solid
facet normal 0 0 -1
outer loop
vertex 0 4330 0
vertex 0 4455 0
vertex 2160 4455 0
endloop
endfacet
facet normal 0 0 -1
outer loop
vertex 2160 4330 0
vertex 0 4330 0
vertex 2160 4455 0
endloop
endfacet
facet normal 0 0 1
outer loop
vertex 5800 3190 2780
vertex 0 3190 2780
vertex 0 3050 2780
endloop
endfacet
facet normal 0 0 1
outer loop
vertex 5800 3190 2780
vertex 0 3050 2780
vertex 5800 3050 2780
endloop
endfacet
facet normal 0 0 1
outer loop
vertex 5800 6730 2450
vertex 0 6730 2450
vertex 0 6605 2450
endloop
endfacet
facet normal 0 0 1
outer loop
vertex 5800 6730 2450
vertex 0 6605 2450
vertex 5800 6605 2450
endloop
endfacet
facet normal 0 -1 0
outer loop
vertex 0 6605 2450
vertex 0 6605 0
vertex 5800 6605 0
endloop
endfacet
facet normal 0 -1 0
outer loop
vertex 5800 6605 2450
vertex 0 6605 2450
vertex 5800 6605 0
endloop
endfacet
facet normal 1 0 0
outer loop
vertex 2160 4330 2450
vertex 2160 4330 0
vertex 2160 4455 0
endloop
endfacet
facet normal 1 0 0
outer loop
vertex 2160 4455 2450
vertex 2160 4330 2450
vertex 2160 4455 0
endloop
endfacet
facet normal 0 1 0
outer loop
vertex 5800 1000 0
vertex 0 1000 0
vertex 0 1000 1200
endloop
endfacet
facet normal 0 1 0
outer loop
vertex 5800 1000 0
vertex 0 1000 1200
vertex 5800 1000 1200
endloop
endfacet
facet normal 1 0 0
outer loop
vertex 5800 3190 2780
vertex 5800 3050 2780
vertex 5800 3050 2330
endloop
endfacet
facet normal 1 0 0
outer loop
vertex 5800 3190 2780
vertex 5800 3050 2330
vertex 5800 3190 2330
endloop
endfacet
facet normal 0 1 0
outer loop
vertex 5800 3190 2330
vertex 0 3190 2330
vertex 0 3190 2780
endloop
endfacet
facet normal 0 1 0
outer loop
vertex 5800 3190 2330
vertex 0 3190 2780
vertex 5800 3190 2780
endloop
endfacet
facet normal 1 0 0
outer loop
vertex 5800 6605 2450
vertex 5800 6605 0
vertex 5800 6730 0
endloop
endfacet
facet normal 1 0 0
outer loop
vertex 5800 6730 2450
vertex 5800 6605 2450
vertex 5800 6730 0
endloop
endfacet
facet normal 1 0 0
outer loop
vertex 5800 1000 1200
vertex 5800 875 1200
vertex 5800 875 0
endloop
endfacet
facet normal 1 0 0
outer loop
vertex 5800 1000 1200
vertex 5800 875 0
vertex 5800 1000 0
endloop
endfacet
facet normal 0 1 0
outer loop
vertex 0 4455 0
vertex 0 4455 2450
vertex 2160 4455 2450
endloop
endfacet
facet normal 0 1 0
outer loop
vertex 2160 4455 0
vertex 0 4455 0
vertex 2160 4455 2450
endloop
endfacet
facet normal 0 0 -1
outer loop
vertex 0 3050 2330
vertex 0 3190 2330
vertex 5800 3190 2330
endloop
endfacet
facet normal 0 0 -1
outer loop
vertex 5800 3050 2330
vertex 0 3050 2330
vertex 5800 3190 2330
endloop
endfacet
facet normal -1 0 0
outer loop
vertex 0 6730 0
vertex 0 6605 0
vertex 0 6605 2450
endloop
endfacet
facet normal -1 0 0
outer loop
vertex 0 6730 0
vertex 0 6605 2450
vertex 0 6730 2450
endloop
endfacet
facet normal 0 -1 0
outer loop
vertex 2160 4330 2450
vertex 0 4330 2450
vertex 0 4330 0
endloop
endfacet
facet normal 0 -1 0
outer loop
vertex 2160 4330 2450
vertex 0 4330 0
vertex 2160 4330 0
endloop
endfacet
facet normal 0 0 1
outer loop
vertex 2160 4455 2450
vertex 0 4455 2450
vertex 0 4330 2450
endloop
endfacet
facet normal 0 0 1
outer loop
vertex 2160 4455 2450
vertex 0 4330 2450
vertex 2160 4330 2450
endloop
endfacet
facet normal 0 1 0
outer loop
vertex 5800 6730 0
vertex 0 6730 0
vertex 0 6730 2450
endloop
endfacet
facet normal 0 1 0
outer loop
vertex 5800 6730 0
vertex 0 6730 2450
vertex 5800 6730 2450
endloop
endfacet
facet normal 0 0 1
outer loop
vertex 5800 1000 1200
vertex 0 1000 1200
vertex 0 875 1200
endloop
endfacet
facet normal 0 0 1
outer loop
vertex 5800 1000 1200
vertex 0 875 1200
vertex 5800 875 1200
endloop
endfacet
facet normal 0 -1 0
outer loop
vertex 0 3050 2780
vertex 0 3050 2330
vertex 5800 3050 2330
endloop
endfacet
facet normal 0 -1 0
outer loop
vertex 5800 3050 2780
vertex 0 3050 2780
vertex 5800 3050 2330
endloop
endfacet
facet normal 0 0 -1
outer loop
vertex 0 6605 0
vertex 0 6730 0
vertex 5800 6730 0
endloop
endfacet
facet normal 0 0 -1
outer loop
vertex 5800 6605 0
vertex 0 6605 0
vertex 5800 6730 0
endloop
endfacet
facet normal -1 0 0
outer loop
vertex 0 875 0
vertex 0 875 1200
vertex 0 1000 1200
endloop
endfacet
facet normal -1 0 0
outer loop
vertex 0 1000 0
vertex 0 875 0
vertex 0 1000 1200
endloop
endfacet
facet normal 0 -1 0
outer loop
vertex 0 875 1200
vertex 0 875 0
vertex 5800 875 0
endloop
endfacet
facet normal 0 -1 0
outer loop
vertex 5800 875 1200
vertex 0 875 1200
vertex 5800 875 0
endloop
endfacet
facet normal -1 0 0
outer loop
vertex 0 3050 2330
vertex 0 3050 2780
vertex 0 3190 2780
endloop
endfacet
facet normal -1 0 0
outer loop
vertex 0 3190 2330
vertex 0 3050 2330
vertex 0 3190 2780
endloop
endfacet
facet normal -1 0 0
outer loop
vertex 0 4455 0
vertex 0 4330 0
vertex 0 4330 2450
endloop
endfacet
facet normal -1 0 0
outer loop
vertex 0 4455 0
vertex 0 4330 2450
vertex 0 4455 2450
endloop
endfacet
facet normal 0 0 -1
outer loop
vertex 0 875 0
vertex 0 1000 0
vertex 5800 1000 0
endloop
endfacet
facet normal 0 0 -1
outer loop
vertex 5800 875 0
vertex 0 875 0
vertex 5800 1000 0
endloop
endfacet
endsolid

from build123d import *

# Parameters (mm, degrees)
F1_W     = 5800
F1_H     = 125
F2_DEPTH = 1200
F3_W     = 2160
F3_H     = 125
F4_DEPTH = 2450
F6_START = 2330
F5_W     = 5800
F5_H     = 140
F6_DEPTH = 450
F7_W     = 5800
F7_H     = 125
F8_DEPTH = 2450


with BuildPart() as f2:
    # F1 (on face) → F2 (new body)
    with BuildSketch(Plane.XY):
        with Locations((2900, 937.5)):
            Rectangle(F1_W, F1_H)
    extrude(amount=F2_DEPTH)


with BuildPart() as f4:
    # F3 (on face) → F4 (new body)
    with BuildSketch(Plane.XY):
        with Locations((1080, 4392.5)):
            Rectangle(F3_W, F3_H)
    extrude(amount=F4_DEPTH)


with BuildPart() as f6:
    # F5 (on face) → F6 (new body)
    with BuildSketch(Plane.XY.offset(F6_START)):
        with Locations((2900, 3120)):
            Rectangle(F5_W, F5_H)
    extrude(amount=F6_DEPTH)


with BuildPart() as f8:
    # F7 (on face) → F8 (new body)
    with BuildSketch(Plane.XY):
        with Locations((2900, 6667.5)):
            Rectangle(F7_W, F7_H)
    extrude(amount=F8_DEPTH)


solid = Compound([f2.part, f4.part, f6.part, f8.part])
